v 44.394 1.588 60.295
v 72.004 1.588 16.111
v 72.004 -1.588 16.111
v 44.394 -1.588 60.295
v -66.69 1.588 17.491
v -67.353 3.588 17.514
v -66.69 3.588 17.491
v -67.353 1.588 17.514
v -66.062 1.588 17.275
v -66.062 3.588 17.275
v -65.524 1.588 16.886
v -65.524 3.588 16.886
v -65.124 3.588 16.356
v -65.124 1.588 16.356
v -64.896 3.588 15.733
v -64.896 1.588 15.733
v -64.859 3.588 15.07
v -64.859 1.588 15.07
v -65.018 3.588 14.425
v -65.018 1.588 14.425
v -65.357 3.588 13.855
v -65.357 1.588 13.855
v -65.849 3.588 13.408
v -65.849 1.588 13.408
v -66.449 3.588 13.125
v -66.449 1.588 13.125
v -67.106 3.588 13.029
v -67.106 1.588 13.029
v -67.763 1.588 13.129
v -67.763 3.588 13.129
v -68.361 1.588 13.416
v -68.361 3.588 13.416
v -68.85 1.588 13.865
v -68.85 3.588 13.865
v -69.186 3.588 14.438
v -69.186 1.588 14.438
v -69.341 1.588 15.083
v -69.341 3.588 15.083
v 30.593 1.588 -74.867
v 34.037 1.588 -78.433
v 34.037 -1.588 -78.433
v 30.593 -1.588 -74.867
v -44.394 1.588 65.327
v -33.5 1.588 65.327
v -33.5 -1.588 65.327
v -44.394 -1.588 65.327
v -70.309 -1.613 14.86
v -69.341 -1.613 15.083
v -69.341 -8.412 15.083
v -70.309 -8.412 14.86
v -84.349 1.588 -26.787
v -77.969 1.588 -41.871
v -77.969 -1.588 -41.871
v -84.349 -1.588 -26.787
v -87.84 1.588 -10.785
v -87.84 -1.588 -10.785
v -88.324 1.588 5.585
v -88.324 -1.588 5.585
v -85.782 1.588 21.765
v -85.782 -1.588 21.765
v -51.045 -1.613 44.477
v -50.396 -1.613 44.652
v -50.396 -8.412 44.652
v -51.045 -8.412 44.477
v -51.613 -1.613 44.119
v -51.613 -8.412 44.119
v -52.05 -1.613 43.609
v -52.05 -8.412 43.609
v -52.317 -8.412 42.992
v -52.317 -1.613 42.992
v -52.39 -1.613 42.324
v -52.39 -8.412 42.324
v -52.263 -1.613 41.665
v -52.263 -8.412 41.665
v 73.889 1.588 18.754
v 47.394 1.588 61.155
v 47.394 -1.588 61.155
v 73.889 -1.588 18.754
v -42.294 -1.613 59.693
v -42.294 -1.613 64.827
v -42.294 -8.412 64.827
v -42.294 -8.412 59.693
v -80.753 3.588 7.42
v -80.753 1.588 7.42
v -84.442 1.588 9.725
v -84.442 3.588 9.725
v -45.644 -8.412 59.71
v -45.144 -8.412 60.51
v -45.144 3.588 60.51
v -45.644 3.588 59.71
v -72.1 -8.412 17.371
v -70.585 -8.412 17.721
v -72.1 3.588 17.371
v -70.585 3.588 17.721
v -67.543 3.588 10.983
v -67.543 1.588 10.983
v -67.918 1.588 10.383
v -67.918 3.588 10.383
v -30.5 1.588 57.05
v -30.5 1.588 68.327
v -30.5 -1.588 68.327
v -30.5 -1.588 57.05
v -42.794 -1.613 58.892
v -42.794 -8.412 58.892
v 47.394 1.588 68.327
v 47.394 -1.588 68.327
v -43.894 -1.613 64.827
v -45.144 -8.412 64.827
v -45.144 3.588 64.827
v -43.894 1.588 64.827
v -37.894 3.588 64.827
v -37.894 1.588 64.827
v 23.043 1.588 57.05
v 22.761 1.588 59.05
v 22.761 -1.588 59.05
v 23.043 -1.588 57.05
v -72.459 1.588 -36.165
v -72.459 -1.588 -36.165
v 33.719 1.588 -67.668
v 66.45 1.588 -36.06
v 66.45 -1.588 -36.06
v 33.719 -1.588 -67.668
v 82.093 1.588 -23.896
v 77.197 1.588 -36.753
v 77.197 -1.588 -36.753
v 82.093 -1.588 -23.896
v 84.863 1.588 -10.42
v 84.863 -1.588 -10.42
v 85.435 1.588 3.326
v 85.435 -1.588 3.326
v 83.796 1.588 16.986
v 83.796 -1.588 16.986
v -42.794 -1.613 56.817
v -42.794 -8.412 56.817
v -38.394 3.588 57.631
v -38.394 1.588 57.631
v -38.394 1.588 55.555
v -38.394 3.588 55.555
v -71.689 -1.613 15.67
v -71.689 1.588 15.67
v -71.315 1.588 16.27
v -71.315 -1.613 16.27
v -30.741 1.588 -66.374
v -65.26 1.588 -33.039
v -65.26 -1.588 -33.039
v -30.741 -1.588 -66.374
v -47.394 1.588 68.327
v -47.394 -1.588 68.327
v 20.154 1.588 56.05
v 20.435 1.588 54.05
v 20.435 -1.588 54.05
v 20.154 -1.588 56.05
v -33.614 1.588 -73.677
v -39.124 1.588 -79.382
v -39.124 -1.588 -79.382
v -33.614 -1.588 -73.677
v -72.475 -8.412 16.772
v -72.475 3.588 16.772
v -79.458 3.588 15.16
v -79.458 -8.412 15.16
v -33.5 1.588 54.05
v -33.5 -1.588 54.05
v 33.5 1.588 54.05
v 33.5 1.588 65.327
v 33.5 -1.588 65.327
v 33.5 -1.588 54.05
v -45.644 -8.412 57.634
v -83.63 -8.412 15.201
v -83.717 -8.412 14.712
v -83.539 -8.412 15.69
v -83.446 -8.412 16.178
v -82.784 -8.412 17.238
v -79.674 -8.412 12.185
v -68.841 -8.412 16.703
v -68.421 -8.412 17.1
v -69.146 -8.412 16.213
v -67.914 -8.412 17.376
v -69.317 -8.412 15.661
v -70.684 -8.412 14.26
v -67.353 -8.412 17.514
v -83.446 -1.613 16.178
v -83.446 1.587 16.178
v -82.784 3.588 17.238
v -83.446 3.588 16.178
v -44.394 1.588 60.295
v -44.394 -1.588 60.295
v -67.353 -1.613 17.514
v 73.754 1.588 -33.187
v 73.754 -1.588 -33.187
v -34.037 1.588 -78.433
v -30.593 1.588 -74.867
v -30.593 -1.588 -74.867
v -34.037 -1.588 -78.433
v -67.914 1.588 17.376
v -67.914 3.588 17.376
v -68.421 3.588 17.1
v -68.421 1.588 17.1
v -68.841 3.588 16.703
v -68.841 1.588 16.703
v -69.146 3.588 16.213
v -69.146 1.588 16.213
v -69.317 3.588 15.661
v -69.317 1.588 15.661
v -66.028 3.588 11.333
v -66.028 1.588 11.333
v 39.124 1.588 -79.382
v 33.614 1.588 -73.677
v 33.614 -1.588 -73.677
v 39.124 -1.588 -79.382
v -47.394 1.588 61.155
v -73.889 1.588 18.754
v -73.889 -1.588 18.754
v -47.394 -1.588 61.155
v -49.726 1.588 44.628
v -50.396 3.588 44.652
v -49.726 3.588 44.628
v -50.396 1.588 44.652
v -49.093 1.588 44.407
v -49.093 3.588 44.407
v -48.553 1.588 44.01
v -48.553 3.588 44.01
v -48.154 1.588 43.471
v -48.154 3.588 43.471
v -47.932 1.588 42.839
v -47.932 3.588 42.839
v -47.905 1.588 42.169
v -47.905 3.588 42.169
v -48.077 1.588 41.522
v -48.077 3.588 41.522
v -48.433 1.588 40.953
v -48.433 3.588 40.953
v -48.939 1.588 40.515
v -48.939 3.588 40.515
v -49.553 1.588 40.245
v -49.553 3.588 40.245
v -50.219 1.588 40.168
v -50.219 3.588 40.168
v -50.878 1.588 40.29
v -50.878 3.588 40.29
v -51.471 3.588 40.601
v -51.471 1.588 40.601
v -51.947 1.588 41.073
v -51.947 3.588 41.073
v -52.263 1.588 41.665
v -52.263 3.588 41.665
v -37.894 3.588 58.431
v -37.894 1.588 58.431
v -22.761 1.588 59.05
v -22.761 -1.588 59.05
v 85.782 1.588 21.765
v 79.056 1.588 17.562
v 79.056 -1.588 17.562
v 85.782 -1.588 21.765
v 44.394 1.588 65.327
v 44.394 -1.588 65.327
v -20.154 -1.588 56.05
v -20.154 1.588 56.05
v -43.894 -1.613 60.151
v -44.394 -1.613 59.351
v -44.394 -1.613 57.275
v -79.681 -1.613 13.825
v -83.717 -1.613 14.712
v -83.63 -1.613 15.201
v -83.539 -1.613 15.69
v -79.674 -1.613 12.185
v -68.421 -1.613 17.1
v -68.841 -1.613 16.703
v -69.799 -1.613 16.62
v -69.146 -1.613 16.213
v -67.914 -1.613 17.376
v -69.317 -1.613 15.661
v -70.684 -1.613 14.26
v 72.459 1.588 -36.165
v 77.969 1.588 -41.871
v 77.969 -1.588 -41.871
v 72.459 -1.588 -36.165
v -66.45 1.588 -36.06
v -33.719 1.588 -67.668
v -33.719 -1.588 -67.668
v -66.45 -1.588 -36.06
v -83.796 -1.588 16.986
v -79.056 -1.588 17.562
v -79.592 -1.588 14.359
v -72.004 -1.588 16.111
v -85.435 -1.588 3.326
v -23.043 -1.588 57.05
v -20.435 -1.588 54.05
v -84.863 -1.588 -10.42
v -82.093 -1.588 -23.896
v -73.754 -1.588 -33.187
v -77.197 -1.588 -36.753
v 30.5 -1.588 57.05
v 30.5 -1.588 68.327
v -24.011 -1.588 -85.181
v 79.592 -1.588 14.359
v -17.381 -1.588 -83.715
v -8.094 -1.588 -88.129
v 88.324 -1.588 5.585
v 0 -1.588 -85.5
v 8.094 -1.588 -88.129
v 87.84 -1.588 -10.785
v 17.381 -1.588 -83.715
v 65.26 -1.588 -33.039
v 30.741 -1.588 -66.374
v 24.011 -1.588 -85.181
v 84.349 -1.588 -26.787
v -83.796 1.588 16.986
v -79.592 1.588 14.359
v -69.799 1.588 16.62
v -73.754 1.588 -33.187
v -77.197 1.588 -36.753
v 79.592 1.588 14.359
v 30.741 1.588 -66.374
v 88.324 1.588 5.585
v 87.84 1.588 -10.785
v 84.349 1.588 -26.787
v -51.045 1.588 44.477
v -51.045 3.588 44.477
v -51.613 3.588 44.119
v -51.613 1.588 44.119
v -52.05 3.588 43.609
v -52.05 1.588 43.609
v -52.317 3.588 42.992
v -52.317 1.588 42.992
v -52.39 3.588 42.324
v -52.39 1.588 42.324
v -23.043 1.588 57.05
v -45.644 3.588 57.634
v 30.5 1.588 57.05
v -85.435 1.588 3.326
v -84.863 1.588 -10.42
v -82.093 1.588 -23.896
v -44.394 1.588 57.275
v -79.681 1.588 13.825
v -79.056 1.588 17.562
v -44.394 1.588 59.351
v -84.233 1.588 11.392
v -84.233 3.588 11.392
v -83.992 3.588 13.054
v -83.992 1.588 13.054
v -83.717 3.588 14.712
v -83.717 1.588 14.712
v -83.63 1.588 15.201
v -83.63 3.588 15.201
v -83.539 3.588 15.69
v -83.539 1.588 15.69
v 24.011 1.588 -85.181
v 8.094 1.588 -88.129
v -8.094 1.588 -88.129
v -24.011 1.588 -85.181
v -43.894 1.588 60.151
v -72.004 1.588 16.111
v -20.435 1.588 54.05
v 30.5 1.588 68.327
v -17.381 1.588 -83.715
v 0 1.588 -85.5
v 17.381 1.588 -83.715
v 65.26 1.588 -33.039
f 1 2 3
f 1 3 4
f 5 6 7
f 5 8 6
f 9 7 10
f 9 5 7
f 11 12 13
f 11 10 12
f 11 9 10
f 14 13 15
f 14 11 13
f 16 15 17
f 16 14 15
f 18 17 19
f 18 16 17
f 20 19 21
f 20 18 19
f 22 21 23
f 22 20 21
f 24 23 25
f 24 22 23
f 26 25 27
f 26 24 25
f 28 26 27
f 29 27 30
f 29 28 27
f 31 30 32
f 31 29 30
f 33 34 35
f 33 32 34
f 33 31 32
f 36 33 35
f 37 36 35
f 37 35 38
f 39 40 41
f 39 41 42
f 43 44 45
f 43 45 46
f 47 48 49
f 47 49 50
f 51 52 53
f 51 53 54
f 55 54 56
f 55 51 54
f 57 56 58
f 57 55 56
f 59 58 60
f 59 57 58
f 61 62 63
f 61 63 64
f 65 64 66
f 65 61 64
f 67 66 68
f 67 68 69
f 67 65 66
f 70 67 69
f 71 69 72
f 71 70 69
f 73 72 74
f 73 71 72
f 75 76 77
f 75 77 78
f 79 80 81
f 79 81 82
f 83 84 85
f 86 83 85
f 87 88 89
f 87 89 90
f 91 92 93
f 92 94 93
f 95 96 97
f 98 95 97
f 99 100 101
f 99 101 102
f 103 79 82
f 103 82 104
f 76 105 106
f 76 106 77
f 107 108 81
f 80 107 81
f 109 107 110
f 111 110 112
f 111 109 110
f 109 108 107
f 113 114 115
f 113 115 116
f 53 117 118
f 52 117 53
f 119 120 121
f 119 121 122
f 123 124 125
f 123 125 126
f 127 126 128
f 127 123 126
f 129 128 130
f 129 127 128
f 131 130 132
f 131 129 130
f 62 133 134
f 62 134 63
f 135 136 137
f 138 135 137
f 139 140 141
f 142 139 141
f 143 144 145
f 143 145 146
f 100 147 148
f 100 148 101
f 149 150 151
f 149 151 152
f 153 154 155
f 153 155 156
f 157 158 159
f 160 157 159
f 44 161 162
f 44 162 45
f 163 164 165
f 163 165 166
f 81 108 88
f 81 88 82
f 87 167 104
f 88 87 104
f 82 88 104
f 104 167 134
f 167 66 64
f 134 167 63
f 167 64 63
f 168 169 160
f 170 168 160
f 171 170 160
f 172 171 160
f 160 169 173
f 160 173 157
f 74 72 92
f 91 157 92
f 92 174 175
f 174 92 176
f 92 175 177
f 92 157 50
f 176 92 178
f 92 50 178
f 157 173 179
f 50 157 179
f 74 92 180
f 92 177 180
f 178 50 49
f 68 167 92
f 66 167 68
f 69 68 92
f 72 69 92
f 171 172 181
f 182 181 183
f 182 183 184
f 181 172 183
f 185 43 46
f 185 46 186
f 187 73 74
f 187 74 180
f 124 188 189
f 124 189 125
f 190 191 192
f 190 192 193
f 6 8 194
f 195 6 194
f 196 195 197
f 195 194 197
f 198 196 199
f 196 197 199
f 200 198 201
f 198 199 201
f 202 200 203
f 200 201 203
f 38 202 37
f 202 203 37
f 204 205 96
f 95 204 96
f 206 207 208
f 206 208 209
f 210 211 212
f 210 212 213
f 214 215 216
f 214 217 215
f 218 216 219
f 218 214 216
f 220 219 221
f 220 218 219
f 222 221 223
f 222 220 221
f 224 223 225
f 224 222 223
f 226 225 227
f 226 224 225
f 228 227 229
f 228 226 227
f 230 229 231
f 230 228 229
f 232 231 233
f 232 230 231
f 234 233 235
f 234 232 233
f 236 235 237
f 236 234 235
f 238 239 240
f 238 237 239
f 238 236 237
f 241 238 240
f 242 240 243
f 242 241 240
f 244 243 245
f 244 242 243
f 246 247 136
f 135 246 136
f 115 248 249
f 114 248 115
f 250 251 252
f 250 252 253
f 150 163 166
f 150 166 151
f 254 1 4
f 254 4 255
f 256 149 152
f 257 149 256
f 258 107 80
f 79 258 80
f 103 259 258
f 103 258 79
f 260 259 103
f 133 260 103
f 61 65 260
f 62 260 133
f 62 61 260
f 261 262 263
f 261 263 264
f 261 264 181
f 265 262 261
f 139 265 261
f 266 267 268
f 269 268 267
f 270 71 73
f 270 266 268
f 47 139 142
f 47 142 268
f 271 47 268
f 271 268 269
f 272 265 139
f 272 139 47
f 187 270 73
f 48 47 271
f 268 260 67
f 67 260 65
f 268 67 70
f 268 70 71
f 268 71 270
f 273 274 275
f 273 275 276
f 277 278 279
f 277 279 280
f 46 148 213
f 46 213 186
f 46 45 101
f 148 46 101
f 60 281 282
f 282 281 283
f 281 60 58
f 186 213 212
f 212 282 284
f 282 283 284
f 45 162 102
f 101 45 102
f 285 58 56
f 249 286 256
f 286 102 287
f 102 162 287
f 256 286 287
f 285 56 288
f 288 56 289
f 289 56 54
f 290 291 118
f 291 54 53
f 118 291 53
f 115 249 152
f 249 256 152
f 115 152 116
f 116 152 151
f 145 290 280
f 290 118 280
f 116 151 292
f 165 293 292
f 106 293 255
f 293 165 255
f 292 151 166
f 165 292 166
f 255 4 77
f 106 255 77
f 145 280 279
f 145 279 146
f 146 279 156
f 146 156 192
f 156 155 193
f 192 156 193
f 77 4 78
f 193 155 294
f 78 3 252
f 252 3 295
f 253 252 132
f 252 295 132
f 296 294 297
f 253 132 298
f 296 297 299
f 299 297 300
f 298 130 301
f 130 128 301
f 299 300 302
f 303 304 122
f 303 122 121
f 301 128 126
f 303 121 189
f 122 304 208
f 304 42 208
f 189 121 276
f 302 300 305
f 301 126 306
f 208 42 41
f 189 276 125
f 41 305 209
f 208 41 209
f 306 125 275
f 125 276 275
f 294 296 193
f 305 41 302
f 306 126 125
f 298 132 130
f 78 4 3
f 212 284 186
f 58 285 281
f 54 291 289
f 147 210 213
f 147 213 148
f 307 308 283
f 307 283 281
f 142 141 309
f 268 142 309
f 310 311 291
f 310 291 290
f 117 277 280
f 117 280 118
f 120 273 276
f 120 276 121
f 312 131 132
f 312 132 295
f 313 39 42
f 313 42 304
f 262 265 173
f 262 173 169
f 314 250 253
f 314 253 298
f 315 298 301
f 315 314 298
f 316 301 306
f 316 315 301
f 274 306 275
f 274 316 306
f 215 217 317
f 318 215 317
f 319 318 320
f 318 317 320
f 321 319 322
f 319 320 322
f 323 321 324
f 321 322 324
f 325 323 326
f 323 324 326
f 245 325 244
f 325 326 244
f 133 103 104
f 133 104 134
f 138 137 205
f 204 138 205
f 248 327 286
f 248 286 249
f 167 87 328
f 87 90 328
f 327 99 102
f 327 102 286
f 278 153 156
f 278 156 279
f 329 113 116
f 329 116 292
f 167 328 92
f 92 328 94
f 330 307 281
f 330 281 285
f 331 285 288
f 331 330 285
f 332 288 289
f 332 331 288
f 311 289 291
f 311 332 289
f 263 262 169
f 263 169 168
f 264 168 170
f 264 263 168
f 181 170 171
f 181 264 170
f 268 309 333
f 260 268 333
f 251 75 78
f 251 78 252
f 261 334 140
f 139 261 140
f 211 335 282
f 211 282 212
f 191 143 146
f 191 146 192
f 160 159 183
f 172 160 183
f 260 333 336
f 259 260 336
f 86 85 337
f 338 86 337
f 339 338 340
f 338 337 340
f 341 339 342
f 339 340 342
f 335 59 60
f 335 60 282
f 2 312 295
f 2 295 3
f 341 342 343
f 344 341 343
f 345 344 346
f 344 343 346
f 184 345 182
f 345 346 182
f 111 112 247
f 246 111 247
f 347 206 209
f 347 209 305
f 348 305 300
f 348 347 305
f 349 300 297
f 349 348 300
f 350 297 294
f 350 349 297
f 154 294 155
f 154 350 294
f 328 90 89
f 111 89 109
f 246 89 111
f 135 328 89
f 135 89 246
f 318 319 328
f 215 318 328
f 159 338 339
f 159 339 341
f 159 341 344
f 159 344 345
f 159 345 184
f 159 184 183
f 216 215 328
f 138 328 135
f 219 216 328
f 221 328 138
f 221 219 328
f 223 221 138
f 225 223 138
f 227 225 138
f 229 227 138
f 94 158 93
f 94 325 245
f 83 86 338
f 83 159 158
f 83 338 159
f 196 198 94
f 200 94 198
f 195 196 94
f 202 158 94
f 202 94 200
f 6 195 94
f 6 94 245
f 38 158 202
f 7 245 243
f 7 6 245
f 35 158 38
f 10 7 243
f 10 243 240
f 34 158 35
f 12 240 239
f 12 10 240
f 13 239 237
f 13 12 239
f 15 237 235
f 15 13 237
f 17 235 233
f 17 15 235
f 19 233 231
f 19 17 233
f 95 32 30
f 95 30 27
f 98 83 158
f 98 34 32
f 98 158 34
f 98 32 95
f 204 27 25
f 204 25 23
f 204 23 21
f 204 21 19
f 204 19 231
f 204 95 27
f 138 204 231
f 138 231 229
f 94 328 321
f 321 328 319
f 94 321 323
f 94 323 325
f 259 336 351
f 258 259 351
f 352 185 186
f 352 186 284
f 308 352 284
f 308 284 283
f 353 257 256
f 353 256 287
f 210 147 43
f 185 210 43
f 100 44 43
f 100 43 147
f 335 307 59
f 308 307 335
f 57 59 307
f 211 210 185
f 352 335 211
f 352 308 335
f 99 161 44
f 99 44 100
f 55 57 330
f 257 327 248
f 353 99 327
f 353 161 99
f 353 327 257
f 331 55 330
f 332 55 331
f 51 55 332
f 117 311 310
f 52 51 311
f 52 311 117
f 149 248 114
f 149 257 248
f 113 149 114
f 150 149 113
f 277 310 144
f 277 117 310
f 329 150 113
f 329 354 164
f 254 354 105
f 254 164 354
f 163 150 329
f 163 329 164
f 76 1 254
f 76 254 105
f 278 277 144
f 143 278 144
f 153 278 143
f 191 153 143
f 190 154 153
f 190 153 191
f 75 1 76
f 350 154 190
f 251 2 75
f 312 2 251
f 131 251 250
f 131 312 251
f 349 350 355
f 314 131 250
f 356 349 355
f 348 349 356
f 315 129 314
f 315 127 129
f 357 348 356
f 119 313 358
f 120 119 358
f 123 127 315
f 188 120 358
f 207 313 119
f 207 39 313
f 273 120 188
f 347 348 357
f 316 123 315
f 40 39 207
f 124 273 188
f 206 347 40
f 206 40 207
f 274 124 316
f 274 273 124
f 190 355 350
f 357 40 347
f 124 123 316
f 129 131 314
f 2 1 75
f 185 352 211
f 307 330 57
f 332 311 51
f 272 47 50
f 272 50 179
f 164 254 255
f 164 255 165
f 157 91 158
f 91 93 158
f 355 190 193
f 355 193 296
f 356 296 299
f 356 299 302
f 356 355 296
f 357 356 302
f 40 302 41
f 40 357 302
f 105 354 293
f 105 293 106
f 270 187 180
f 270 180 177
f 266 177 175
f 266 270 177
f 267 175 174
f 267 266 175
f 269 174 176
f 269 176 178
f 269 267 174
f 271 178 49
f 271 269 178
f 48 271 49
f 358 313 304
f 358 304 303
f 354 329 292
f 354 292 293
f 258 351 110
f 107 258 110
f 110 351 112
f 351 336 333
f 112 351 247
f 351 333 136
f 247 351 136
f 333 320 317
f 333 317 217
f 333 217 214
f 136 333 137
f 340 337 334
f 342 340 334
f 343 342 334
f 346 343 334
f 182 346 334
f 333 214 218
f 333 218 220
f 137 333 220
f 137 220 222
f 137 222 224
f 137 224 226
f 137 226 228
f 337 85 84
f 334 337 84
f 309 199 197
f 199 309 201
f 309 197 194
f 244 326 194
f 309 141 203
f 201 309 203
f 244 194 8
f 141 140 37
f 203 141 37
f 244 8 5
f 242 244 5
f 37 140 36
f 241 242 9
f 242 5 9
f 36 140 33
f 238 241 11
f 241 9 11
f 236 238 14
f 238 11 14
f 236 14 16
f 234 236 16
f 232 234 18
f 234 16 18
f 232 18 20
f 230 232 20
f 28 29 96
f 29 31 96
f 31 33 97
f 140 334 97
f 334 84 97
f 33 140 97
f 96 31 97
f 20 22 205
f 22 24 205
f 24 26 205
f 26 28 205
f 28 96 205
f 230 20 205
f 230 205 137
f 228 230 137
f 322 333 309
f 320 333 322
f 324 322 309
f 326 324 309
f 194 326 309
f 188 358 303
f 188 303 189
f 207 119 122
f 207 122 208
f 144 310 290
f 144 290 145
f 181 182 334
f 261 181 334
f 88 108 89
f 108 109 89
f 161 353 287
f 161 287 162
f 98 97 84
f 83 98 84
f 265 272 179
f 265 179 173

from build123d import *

# Parameters (mm, degrees)
BOSS_EXTRUDE4_DEPTH  = 1.5875
M3_CLEARANCE_HOLE4_D = 2.95
BOSS_EXTRUDE6_DEPTH  = 3.175
BOSS_EXTRUDE7_DEPTH  = 3.175
SKETCH27_R           = 2.25
BOSS_EXTRUDE8_DEPTH  = 2
BOSS_EXTRUDE9_DEPTH  = 10
BOSS_EXTRUDE11_START = -3.2
BOSS_EXTRUDE11_DEPTH = 6.8


with BuildPart() as part:
    # Sketch1 → Boss-Extrude4 (new, symmetric)
    with BuildSketch(Plane(origin=(0, 0, 0), x_dir=(1, 0, 0), z_dir=(0, 1, 0))):
        with BuildLine():
            Line((-62.799553621, 32.496136604), (-73.969425011, 32.691107434))
            Line((-73.969425011, 32.691107434), (-77.053684287, 35.88495141))
            ThreePointArc((-77.053684287, 35.88495141), (-84.36642289, 10.358894189), (-83.446216027, -16.178041625))
            Line((-83.446216027, -16.178041625), (-79.680911643, -13.825218315))
            Line((-79.680911643, -13.825218315), (-69.484649137, -16.179210996))
            Line((-69.484649137, -16.179210996), (-43.894490772, -57.132025032))
            Line((-43.894490772, -57.132025032), (-43.894490772, -64.826600275))
            Line((-43.894490772, -64.826600275), (-43.094490772, -64.826600275))
            Line((-43.094490772, -64.826600275), (-34, -64.826600275))
            Line((-34, -64.826600275), (-34, -55.55))
            Line((-34, -55.55), (-34, -53.55))
            Line((-34, -53.55), (-20, -53.55))
            Line((-20, -53.55), (-19.718918331, -55.55))
            Line((-19.718918331, -55.55), (19.718918331, -55.55))
            Line((19.718918331, -55.55), (20, -53.55))
            Line((20, -53.55), (34, -53.55))
            Line((34, -53.55), (34, -55.55))
            Line((34, -55.55), (34, -64.826600275))
            Line((34, -64.826600275), (43.094490772, -64.826600275))
            Line((43.094490772, -64.826600275), (43.894490772, -64.826600275))
            Line((43.894490772, -64.826600275), (43.894490772, -57.132025032))
            Line((43.894490772, -57.132025032), (69.484649137, -16.179210996))
            Line((69.484649137, -16.179210996), (79.680911643, -13.825218315))
            Line((79.680911643, -13.825218315), (83.446216027, -16.178041625))
            ThreePointArc((83.446216027, -16.178041625), (84.610662337, -8.126242604), (85, 0))
            ThreePointArc((85, 0), (82.98964744, 18.377116688), (77.053684287, 35.88495141))
            Line((77.053684287, 35.88495141), (73.969425011, 32.691107434))
            Line((73.969425011, 32.691107434), (62.799553621, 32.496136604))
            Line((62.799553621, 32.496136604), (30.284668021, 63.895396642))
            Line((30.284668021, 63.895396642), (30.089697191, 75.065268032))
            Line((30.089697191, 75.065268032), (33.173956467, 78.259112008))
            ThreePointArc((33.173956467, 78.259112008), (0, 85), (-33.173956467, 78.259112008))
            Line((-33.173956467, 78.259112008), (-30.089697191, 75.065268032))
            Line((-30.089697191, 75.065268032), (-30.284668021, 63.895396642))
            Line((-30.284668021, 63.895396642), (-62.799553621, 32.496136604))
        make_face()
    extrude(amount=BOSS_EXTRUDE4_DEPTH, both=True)

    # M3 Clearance Hole4 (through all)
    with Locations(Plane(origin=(0, -1.5875, 0), x_dir=(-1, 0, 0), z_dir=(0, -1, 0))):
        with Locations((-67.099301622, -15.278865202), (-50.141885166, -42.416404279), (-61.062544382, 30.698137949), (-38.043670771, 52.927205804), (50.141885166, -42.416404279), (67.099301622, -15.278865202), (38.043670771, 52.927205804), (61.062544382, 30.698137949)):
            Hole(M3_CLEARANCE_HOLE4_D / 2)

    # Sketch22 → Boss-Extrude6 (add)
    with BuildSketch(Plane(origin=(0, 1.5875, 0), x_dir=(1, 0, 0), z_dir=(0, 1, 0))):
        Polygon((-30.780977357, 64.111198083), (-62.997902655, 32.999674963), (-64.553300643, 33.026824536), (-65.061950694, 32.535626892), (-62.799553621, 32.496136604), (-30.284668021, 63.895396642), (-30.245177733, 66.157793715), (-30.753827784, 65.66659607), align=None)
        Polygon((-69.484649137, -16.179210996), (-71.689396914, -15.670204865), (-71.314687409, -16.269865425), (-69.798923312, -16.61980714), (-44.394490772, -57.275397724), (-44.394490772, -59.351185631), (-43.894490772, -60.151352895), (-43.894490772, -57.132025032), align=None)
        Polygon((30.753827784, 65.66659607), (30.245177733, 66.157793715), (30.284668021, 63.895396642), (62.799553621, 32.496136604), (65.061950694, 32.535626892), (64.553300643, 33.026824536), (62.997902655, 32.999674963), (30.780977357, 64.111198083), align=None)
        Polygon((69.798923312, -16.61980714), (71.314687409, -16.269865425), (71.689396914, -15.670204865), (69.484649137, -16.179210996), (43.894490772, -57.132025032), (43.894490772, -60.151352895), (44.394490772, -59.351185631), (44.394490772, -57.275397724), align=None)
    extrude(amount=-BOSS_EXTRUDE6_DEPTH)


with BuildPart() as body_2:
    # Sketch22<3> → Boss-Extrude7 (new body)
    with BuildSketch(Plane(origin=(0, 1.5875, 0), x_dir=(1, 0, 0), z_dir=(0, 1, 0))):
        with BuildLine():
            ThreePointArc((-77.96852441, 41.870743978), (-87.84033442, 10.785436891), (-85.781975773, -21.764710716))
            Line((-85.781975773, -21.764710716), (-79.055649799, -17.561635764))
            Line((-79.055649799, -17.561635764), (-73.889316139, -18.754377871))
            Line((-73.889316139, -18.754377871), (-47.394490772, -61.154961745))
            Line((-47.394490772, -61.154961745), (-47.394490772, -68.326600275))
            Line((-47.394490772, -68.326600275), (-30.5, -68.326600275))
            Line((-30.5, -68.326600275), (-30.5, -57.05))
            Line((-30.5, -57.05), (-23.042503582, -57.05))
            Line((-23.042503582, -57.05), (-22.761421913, -59.05))
            Line((-22.761421913, -59.05), (22.761421913, -59.05))
            Line((22.761421913, -59.05), (23.042503582, -57.05))
            Line((23.042503582, -57.05), (30.5, -57.05))
            Line((30.5, -57.05), (30.5, -68.326600275))
            Line((30.5, -68.326600275), (47.394490772, -68.326600275))
            Line((47.394490772, -68.326600275), (47.394490772, -61.154961745))
            Line((47.394490772, -61.154961745), (73.889316139, -18.754377871))
            Line((73.889316139, -18.754377871), (79.055649799, -17.561635764))
            Line((79.055649799, -17.561635764), (85.781975773, -21.764710716))
            ThreePointArc((85.781975773, -21.764710716), (87.84033442, 10.785436891), (77.96852441, 41.870743978))
            Line((77.96852441, 41.870743978), (72.458814924, 36.165272785))
            Line((72.458814924, 36.165272785), (66.450393936, 36.060395407))
            Line((66.450393936, 36.060395407), (33.719343084, 67.668403802))
            Line((33.719343084, 67.668403802), (33.614465706, 73.67682479))
            Line((33.614465706, 73.67682479), (39.124175192, 79.382295983))
            ThreePointArc((39.124175192, 79.382295983), (0, 88.5), (-39.124175192, 79.382295983))
            Line((-39.124175192, 79.382295983), (-33.614465706, 73.67682479))
            Line((-33.614465706, 73.67682479), (-33.719343084, 67.668403802))
            Line((-33.719343084, 67.668403802), (-66.450393936, 36.060395407))
            Line((-66.450393936, 36.060395407), (-72.458814924, 36.165272785))
            Line((-72.458814924, 36.165272785), (-77.96852441, 41.870743978))
        make_face()
        with BuildLine():
            Line((-73.75362357, 33.18741677), (-65.260299728, 33.039165251))
            Line((-65.260299728, 33.039165251), (-30.741487069, 66.373595156))
            Line((-30.741487069, 66.373595156), (-30.59323555, 74.866918998))
            Line((-30.59323555, 74.866918998), (-34.036959375, 78.43299941))
            ThreePointArc((-34.036959375, 78.43299941), (0, 85.5), (34.036959375, 78.43299941))
            Line((34.036959375, 78.43299941), (30.59323555, 74.866918998))
            Line((30.59323555, 74.866918998), (30.741487069, 66.373595156))
            Line((30.741487069, 66.373595156), (65.260299728, 33.039165251))
            Line((65.260299728, 33.039165251), (73.75362357, 33.18741677))
            Line((73.75362357, 33.18741677), (77.197347395, 36.753497183))
            ThreePointArc((77.197347395, 36.753497183), (84.862695965, 10.419828861), (83.795731966, -16.986032625))
            Line((83.795731966, -16.986032625), (79.591588523, -14.358992237))
            Line((79.591588523, -14.358992237), (72.003671089, -16.110801009))
            Line((72.003671089, -16.110801009), (44.394490772, -60.294725588))
            Line((44.394490772, -60.294725588), (44.394490772, -65.326600275))
            Line((44.394490772, -65.326600275), (33.5, -65.326600275))
            Line((33.5, -65.326600275), (33.5, -54.05))
            Line((33.5, -54.05), (20.434643369, -54.05))
            Line((20.434643369, -54.05), (20.1535617, -56.05))
            Line((20.1535617, -56.05), (-20.1535617, -56.05))
            Line((-20.1535617, -56.05), (-20.434643369, -54.05))
            Line((-20.434643369, -54.05), (-33.5, -54.05))
            Line((-33.5, -54.05), (-33.5, -65.326600275))
            Line((-33.5, -65.326600275), (-44.394490772, -65.326600275))
            Line((-44.394490772, -65.326600275), (-44.394490772, -60.294725588))
            Line((-44.394490772, -60.294725588), (-72.003671089, -16.110801009))
            Line((-72.003671089, -16.110801009), (-79.591588523, -14.358992237))
            Line((-79.591588523, -14.358992237), (-83.795731966, -16.986032625))
            ThreePointArc((-83.795731966, -16.986032625), (-84.862695965, 10.419828861), (-77.197347395, 36.753497183))
            Line((-77.197347395, 36.753497183), (-73.75362357, 33.18741677))
        make_face(mode=Mode.SUBTRACT)
    extrude(amount=-BOSS_EXTRUDE7_DEPTH)


with BuildPart() as body_3:
    # Sketch27 → Boss-Extrude8 (new body)
    # profile 1 of 3: a face of its own
    with BuildSketch(Plane(origin=(0, 1.5875, 0), x_dir=(1, 0, 0), z_dir=(0, 1, 0))):
        with BuildLine():
            Line((-80.752789091, -7.419931261), (-84.441828779, -9.7250991))
            ThreePointArc((-84.441828779, -9.7250991), (-84.006005821, -12.961133671), (-83.446216027, -16.178041625))
            Line((-83.446216027, -16.178041625), (-79.680911643, -13.825218315))
            Line((-79.680911643, -13.825218315), (-71.689396914, -15.670204865))
            Line((-71.689396914, -15.670204865), (-71.314687409, -16.269865425))
            Line((-71.314687409, -16.269865425), (-69.798923312, -16.61980714))
            Line((-69.798923312, -16.61980714), (-44.394490772, -57.275397724))
            Line((-44.394490772, -57.275397724), (-44.394490772, -59.351185631))
            Line((-44.394490772, -59.351185631), (-43.894490772, -60.151352895))
            Line((-43.894490772, -60.151352895), (-43.894490772, -64.826600275))
            Line((-43.894490772, -64.826600275), (-37.894490772, -64.826600275))
            Line((-37.894490772, -64.826600275), (-37.894490772, -58.430880581))
            Line((-37.894490772, -58.430880581), (-38.394490772, -57.630713316))
            Line((-38.394490772, -57.630713316), (-38.394490772, -55.55492541))
            Line((-38.394490772, -55.55492541), (-66.027633212, -11.332653417))
            Line((-66.027633212, -11.332653417), (-67.543397309, -10.982711702))
            Line((-67.543397309, -10.982711702), (-67.918106814, -10.383051142))
            Line((-67.918106814, -10.383051142), (-80.752789091, -7.419931261))
        make_face()
        with Locations(Location((-67.099301622, -15.278865202, 0), (0, 0, 270))):
            Circle(SKETCH27_R, mode=Mode.SUBTRACT)
        with Locations(Location((-50.141885166, -42.416404279, 0), (0, 0, 270))):
            Circle(SKETCH27_R, mode=Mode.SUBTRACT)
    # profile 2 of 3: a face of its own
    with BuildSketch(Plane(origin=(0, 1.5875, 0), x_dir=(1, 0, 0), z_dir=(0, 1, 0))):
        Polygon((-82.783816946, -17.238101746), (-83.446216027, -16.178041625), (-79.680911643, -13.825218315), (-71.689396914, -15.670204865), (-71.314687409, -16.269865425), (-69.798923312, -16.61980714), (-44.394490772, -57.275397724), (-44.394490772, -59.351185631), (-43.894490772, -60.151352895), (-43.894490772, -64.826600275), (-45.144490772, -64.826600275), (-45.144490772, -60.509784627), (-45.644490772, -59.709617363), (-45.644490772, -57.633829457), (-70.58460875, -17.721297499), (-72.100372846, -17.371355784), (-72.475082351, -16.771695224), (-79.457603842, -15.159653118), align=None)
    # profile 3 of 3: a face of its own
    with BuildSketch(Plane(origin=(0, 1.5875, 0), x_dir=(1, 0, 0), z_dir=(0, 1, 0))):
        with BuildLine():
            Line((-43.894490772, -60.151352895), (-43.894490772, -64.826600275))
            Line((-43.894490772, -64.826600275), (-42.294490772, -64.826600275))
            Line((-42.294490772, -64.826600275), (-42.294490772, -59.692560278))
            Line((-42.294490772, -59.692560278), (-42.794490772, -58.892393013))
            Line((-42.794490772, -58.892393013), (-42.794490772, -56.816605107))
            Line((-42.794490772, -56.816605107), (-50.395757216, -44.652035953))
            ThreePointArc((-50.395757216, -44.652035953), (-52.049993383, -43.608722624), (-52.262547786, -41.664546545))
            Line((-52.262547786, -41.664546545), (-67.353173671, -17.514496876))
            ThreePointArc((-67.353173671, -17.514496876), (-68.841190006, -16.703057905), (-69.340802678, -15.08348605))
            Line((-69.340802678, -15.08348605), (-70.309010049, -14.859957765))
            Line((-70.309010049, -14.859957765), (-70.683719554, -14.260297206))
            Line((-70.683719554, -14.260297206), (-79.673649637, -12.184808309))
            Line((-79.673649637, -12.184808309), (-83.717211954, -14.711506473))
            ThreePointArc((-83.717211954, -14.711506473), (-83.584930429, -15.445368404), (-83.446216027, -16.178041625))
            Line((-83.446216027, -16.178041625), (-79.680911643, -13.825218315))
            Line((-79.680911643, -13.825218315), (-71.689396914, -15.670204865))
            Line((-71.689396914, -15.670204865), (-71.314687409, -16.269865425))
            Line((-71.314687409, -16.269865425), (-69.798923312, -16.61980714))
            Line((-69.798923312, -16.61980714), (-44.394490772, -57.275397724))
            Line((-44.394490772, -57.275397724), (-44.394490772, -59.351185631))
            Line((-44.394490772, -59.351185631), (-43.894490772, -60.151352895))
        make_face()
    extrude(amount=BOSS_EXTRUDE8_DEPTH)

    # Sketch27<3> → Boss-Extrude9 (add)
    with BuildSketch(Plane(origin=(0, 1.5875, 0), x_dir=(1, 0, 0), z_dir=(0, 1, 0))):
        Polygon((-82.783816946, -17.238101746), (-83.446216027, -16.178041625), (-79.680911643, -13.825218315), (-71.689396914, -15.670204865), (-71.314687409, -16.269865425), (-69.798923312, -16.61980714), (-44.394490772, -57.275397724), (-44.394490772, -59.351185631), (-43.894490772, -60.151352895), (-43.894490772, -64.826600275), (-45.144490772, -64.826600275), (-45.144490772, -60.509784627), (-45.644490772, -59.709617363), (-45.644490772, -57.633829457), (-70.58460875, -17.721297499), (-72.100372846, -17.371355784), (-72.475082351, -16.771695224), (-79.457603842, -15.159653118), align=None)
    extrude(amount=-BOSS_EXTRUDE9_DEPTH)

    # Sketch27<7> → Boss-Extrude11 (add)
    with BuildSketch(Plane(origin=(0, 1.5875, 0), x_dir=(1, 0, 0), z_dir=(0, 1, 0)).offset(BOSS_EXTRUDE11_START)):
        with BuildLine():
            Line((-43.894490772, -60.151352895), (-43.894490772, -64.826600275))
            Line((-43.894490772, -64.826600275), (-42.294490772, -64.826600275))
            Line((-42.294490772, -64.826600275), (-42.294490772, -59.692560278))
            Line((-42.294490772, -59.692560278), (-42.794490772, -58.892393013))
            Line((-42.794490772, -58.892393013), (-42.794490772, -56.816605107))
            Line((-42.794490772, -56.816605107), (-50.395757216, -44.652035953))
            ThreePointArc((-50.395757216, -44.652035953), (-52.049993383, -43.608722624), (-52.262547786, -41.664546545))
            Line((-52.262547786, -41.664546545), (-67.353173671, -17.514496876))
            ThreePointArc((-67.353173671, -17.514496876), (-68.841190006, -16.703057905), (-69.340802678, -15.08348605))
            Line((-69.340802678, -15.08348605), (-70.309010049, -14.859957765))
            Line((-70.309010049, -14.859957765), (-70.683719554, -14.260297206))
            Line((-70.683719554, -14.260297206), (-79.673649637, -12.184808309))
            Line((-79.673649637, -12.184808309), (-83.717211954, -14.711506473))
            ThreePointArc((-83.717211954, -14.711506473), (-83.584930429, -15.445368404), (-83.446216027, -16.178041625))
            Line((-83.446216027, -16.178041625), (-79.680911643, -13.825218315))
            Line((-79.680911643, -13.825218315), (-71.689396914, -15.670204865))
            Line((-71.689396914, -15.670204865), (-71.314687409, -16.269865425))
            Line((-71.314687409, -16.269865425), (-69.798923312, -16.61980714))
            Line((-69.798923312, -16.61980714), (-44.394490772, -57.275397724))
            Line((-44.394490772, -57.275397724), (-44.394490772, -59.351185631))
            Line((-44.394490772, -59.351185631), (-43.894490772, -60.151352895))
        make_face()
    extrude(amount=-BOSS_EXTRUDE11_DEPTH)


solid = Compound([body_2.part, body_3.part])
